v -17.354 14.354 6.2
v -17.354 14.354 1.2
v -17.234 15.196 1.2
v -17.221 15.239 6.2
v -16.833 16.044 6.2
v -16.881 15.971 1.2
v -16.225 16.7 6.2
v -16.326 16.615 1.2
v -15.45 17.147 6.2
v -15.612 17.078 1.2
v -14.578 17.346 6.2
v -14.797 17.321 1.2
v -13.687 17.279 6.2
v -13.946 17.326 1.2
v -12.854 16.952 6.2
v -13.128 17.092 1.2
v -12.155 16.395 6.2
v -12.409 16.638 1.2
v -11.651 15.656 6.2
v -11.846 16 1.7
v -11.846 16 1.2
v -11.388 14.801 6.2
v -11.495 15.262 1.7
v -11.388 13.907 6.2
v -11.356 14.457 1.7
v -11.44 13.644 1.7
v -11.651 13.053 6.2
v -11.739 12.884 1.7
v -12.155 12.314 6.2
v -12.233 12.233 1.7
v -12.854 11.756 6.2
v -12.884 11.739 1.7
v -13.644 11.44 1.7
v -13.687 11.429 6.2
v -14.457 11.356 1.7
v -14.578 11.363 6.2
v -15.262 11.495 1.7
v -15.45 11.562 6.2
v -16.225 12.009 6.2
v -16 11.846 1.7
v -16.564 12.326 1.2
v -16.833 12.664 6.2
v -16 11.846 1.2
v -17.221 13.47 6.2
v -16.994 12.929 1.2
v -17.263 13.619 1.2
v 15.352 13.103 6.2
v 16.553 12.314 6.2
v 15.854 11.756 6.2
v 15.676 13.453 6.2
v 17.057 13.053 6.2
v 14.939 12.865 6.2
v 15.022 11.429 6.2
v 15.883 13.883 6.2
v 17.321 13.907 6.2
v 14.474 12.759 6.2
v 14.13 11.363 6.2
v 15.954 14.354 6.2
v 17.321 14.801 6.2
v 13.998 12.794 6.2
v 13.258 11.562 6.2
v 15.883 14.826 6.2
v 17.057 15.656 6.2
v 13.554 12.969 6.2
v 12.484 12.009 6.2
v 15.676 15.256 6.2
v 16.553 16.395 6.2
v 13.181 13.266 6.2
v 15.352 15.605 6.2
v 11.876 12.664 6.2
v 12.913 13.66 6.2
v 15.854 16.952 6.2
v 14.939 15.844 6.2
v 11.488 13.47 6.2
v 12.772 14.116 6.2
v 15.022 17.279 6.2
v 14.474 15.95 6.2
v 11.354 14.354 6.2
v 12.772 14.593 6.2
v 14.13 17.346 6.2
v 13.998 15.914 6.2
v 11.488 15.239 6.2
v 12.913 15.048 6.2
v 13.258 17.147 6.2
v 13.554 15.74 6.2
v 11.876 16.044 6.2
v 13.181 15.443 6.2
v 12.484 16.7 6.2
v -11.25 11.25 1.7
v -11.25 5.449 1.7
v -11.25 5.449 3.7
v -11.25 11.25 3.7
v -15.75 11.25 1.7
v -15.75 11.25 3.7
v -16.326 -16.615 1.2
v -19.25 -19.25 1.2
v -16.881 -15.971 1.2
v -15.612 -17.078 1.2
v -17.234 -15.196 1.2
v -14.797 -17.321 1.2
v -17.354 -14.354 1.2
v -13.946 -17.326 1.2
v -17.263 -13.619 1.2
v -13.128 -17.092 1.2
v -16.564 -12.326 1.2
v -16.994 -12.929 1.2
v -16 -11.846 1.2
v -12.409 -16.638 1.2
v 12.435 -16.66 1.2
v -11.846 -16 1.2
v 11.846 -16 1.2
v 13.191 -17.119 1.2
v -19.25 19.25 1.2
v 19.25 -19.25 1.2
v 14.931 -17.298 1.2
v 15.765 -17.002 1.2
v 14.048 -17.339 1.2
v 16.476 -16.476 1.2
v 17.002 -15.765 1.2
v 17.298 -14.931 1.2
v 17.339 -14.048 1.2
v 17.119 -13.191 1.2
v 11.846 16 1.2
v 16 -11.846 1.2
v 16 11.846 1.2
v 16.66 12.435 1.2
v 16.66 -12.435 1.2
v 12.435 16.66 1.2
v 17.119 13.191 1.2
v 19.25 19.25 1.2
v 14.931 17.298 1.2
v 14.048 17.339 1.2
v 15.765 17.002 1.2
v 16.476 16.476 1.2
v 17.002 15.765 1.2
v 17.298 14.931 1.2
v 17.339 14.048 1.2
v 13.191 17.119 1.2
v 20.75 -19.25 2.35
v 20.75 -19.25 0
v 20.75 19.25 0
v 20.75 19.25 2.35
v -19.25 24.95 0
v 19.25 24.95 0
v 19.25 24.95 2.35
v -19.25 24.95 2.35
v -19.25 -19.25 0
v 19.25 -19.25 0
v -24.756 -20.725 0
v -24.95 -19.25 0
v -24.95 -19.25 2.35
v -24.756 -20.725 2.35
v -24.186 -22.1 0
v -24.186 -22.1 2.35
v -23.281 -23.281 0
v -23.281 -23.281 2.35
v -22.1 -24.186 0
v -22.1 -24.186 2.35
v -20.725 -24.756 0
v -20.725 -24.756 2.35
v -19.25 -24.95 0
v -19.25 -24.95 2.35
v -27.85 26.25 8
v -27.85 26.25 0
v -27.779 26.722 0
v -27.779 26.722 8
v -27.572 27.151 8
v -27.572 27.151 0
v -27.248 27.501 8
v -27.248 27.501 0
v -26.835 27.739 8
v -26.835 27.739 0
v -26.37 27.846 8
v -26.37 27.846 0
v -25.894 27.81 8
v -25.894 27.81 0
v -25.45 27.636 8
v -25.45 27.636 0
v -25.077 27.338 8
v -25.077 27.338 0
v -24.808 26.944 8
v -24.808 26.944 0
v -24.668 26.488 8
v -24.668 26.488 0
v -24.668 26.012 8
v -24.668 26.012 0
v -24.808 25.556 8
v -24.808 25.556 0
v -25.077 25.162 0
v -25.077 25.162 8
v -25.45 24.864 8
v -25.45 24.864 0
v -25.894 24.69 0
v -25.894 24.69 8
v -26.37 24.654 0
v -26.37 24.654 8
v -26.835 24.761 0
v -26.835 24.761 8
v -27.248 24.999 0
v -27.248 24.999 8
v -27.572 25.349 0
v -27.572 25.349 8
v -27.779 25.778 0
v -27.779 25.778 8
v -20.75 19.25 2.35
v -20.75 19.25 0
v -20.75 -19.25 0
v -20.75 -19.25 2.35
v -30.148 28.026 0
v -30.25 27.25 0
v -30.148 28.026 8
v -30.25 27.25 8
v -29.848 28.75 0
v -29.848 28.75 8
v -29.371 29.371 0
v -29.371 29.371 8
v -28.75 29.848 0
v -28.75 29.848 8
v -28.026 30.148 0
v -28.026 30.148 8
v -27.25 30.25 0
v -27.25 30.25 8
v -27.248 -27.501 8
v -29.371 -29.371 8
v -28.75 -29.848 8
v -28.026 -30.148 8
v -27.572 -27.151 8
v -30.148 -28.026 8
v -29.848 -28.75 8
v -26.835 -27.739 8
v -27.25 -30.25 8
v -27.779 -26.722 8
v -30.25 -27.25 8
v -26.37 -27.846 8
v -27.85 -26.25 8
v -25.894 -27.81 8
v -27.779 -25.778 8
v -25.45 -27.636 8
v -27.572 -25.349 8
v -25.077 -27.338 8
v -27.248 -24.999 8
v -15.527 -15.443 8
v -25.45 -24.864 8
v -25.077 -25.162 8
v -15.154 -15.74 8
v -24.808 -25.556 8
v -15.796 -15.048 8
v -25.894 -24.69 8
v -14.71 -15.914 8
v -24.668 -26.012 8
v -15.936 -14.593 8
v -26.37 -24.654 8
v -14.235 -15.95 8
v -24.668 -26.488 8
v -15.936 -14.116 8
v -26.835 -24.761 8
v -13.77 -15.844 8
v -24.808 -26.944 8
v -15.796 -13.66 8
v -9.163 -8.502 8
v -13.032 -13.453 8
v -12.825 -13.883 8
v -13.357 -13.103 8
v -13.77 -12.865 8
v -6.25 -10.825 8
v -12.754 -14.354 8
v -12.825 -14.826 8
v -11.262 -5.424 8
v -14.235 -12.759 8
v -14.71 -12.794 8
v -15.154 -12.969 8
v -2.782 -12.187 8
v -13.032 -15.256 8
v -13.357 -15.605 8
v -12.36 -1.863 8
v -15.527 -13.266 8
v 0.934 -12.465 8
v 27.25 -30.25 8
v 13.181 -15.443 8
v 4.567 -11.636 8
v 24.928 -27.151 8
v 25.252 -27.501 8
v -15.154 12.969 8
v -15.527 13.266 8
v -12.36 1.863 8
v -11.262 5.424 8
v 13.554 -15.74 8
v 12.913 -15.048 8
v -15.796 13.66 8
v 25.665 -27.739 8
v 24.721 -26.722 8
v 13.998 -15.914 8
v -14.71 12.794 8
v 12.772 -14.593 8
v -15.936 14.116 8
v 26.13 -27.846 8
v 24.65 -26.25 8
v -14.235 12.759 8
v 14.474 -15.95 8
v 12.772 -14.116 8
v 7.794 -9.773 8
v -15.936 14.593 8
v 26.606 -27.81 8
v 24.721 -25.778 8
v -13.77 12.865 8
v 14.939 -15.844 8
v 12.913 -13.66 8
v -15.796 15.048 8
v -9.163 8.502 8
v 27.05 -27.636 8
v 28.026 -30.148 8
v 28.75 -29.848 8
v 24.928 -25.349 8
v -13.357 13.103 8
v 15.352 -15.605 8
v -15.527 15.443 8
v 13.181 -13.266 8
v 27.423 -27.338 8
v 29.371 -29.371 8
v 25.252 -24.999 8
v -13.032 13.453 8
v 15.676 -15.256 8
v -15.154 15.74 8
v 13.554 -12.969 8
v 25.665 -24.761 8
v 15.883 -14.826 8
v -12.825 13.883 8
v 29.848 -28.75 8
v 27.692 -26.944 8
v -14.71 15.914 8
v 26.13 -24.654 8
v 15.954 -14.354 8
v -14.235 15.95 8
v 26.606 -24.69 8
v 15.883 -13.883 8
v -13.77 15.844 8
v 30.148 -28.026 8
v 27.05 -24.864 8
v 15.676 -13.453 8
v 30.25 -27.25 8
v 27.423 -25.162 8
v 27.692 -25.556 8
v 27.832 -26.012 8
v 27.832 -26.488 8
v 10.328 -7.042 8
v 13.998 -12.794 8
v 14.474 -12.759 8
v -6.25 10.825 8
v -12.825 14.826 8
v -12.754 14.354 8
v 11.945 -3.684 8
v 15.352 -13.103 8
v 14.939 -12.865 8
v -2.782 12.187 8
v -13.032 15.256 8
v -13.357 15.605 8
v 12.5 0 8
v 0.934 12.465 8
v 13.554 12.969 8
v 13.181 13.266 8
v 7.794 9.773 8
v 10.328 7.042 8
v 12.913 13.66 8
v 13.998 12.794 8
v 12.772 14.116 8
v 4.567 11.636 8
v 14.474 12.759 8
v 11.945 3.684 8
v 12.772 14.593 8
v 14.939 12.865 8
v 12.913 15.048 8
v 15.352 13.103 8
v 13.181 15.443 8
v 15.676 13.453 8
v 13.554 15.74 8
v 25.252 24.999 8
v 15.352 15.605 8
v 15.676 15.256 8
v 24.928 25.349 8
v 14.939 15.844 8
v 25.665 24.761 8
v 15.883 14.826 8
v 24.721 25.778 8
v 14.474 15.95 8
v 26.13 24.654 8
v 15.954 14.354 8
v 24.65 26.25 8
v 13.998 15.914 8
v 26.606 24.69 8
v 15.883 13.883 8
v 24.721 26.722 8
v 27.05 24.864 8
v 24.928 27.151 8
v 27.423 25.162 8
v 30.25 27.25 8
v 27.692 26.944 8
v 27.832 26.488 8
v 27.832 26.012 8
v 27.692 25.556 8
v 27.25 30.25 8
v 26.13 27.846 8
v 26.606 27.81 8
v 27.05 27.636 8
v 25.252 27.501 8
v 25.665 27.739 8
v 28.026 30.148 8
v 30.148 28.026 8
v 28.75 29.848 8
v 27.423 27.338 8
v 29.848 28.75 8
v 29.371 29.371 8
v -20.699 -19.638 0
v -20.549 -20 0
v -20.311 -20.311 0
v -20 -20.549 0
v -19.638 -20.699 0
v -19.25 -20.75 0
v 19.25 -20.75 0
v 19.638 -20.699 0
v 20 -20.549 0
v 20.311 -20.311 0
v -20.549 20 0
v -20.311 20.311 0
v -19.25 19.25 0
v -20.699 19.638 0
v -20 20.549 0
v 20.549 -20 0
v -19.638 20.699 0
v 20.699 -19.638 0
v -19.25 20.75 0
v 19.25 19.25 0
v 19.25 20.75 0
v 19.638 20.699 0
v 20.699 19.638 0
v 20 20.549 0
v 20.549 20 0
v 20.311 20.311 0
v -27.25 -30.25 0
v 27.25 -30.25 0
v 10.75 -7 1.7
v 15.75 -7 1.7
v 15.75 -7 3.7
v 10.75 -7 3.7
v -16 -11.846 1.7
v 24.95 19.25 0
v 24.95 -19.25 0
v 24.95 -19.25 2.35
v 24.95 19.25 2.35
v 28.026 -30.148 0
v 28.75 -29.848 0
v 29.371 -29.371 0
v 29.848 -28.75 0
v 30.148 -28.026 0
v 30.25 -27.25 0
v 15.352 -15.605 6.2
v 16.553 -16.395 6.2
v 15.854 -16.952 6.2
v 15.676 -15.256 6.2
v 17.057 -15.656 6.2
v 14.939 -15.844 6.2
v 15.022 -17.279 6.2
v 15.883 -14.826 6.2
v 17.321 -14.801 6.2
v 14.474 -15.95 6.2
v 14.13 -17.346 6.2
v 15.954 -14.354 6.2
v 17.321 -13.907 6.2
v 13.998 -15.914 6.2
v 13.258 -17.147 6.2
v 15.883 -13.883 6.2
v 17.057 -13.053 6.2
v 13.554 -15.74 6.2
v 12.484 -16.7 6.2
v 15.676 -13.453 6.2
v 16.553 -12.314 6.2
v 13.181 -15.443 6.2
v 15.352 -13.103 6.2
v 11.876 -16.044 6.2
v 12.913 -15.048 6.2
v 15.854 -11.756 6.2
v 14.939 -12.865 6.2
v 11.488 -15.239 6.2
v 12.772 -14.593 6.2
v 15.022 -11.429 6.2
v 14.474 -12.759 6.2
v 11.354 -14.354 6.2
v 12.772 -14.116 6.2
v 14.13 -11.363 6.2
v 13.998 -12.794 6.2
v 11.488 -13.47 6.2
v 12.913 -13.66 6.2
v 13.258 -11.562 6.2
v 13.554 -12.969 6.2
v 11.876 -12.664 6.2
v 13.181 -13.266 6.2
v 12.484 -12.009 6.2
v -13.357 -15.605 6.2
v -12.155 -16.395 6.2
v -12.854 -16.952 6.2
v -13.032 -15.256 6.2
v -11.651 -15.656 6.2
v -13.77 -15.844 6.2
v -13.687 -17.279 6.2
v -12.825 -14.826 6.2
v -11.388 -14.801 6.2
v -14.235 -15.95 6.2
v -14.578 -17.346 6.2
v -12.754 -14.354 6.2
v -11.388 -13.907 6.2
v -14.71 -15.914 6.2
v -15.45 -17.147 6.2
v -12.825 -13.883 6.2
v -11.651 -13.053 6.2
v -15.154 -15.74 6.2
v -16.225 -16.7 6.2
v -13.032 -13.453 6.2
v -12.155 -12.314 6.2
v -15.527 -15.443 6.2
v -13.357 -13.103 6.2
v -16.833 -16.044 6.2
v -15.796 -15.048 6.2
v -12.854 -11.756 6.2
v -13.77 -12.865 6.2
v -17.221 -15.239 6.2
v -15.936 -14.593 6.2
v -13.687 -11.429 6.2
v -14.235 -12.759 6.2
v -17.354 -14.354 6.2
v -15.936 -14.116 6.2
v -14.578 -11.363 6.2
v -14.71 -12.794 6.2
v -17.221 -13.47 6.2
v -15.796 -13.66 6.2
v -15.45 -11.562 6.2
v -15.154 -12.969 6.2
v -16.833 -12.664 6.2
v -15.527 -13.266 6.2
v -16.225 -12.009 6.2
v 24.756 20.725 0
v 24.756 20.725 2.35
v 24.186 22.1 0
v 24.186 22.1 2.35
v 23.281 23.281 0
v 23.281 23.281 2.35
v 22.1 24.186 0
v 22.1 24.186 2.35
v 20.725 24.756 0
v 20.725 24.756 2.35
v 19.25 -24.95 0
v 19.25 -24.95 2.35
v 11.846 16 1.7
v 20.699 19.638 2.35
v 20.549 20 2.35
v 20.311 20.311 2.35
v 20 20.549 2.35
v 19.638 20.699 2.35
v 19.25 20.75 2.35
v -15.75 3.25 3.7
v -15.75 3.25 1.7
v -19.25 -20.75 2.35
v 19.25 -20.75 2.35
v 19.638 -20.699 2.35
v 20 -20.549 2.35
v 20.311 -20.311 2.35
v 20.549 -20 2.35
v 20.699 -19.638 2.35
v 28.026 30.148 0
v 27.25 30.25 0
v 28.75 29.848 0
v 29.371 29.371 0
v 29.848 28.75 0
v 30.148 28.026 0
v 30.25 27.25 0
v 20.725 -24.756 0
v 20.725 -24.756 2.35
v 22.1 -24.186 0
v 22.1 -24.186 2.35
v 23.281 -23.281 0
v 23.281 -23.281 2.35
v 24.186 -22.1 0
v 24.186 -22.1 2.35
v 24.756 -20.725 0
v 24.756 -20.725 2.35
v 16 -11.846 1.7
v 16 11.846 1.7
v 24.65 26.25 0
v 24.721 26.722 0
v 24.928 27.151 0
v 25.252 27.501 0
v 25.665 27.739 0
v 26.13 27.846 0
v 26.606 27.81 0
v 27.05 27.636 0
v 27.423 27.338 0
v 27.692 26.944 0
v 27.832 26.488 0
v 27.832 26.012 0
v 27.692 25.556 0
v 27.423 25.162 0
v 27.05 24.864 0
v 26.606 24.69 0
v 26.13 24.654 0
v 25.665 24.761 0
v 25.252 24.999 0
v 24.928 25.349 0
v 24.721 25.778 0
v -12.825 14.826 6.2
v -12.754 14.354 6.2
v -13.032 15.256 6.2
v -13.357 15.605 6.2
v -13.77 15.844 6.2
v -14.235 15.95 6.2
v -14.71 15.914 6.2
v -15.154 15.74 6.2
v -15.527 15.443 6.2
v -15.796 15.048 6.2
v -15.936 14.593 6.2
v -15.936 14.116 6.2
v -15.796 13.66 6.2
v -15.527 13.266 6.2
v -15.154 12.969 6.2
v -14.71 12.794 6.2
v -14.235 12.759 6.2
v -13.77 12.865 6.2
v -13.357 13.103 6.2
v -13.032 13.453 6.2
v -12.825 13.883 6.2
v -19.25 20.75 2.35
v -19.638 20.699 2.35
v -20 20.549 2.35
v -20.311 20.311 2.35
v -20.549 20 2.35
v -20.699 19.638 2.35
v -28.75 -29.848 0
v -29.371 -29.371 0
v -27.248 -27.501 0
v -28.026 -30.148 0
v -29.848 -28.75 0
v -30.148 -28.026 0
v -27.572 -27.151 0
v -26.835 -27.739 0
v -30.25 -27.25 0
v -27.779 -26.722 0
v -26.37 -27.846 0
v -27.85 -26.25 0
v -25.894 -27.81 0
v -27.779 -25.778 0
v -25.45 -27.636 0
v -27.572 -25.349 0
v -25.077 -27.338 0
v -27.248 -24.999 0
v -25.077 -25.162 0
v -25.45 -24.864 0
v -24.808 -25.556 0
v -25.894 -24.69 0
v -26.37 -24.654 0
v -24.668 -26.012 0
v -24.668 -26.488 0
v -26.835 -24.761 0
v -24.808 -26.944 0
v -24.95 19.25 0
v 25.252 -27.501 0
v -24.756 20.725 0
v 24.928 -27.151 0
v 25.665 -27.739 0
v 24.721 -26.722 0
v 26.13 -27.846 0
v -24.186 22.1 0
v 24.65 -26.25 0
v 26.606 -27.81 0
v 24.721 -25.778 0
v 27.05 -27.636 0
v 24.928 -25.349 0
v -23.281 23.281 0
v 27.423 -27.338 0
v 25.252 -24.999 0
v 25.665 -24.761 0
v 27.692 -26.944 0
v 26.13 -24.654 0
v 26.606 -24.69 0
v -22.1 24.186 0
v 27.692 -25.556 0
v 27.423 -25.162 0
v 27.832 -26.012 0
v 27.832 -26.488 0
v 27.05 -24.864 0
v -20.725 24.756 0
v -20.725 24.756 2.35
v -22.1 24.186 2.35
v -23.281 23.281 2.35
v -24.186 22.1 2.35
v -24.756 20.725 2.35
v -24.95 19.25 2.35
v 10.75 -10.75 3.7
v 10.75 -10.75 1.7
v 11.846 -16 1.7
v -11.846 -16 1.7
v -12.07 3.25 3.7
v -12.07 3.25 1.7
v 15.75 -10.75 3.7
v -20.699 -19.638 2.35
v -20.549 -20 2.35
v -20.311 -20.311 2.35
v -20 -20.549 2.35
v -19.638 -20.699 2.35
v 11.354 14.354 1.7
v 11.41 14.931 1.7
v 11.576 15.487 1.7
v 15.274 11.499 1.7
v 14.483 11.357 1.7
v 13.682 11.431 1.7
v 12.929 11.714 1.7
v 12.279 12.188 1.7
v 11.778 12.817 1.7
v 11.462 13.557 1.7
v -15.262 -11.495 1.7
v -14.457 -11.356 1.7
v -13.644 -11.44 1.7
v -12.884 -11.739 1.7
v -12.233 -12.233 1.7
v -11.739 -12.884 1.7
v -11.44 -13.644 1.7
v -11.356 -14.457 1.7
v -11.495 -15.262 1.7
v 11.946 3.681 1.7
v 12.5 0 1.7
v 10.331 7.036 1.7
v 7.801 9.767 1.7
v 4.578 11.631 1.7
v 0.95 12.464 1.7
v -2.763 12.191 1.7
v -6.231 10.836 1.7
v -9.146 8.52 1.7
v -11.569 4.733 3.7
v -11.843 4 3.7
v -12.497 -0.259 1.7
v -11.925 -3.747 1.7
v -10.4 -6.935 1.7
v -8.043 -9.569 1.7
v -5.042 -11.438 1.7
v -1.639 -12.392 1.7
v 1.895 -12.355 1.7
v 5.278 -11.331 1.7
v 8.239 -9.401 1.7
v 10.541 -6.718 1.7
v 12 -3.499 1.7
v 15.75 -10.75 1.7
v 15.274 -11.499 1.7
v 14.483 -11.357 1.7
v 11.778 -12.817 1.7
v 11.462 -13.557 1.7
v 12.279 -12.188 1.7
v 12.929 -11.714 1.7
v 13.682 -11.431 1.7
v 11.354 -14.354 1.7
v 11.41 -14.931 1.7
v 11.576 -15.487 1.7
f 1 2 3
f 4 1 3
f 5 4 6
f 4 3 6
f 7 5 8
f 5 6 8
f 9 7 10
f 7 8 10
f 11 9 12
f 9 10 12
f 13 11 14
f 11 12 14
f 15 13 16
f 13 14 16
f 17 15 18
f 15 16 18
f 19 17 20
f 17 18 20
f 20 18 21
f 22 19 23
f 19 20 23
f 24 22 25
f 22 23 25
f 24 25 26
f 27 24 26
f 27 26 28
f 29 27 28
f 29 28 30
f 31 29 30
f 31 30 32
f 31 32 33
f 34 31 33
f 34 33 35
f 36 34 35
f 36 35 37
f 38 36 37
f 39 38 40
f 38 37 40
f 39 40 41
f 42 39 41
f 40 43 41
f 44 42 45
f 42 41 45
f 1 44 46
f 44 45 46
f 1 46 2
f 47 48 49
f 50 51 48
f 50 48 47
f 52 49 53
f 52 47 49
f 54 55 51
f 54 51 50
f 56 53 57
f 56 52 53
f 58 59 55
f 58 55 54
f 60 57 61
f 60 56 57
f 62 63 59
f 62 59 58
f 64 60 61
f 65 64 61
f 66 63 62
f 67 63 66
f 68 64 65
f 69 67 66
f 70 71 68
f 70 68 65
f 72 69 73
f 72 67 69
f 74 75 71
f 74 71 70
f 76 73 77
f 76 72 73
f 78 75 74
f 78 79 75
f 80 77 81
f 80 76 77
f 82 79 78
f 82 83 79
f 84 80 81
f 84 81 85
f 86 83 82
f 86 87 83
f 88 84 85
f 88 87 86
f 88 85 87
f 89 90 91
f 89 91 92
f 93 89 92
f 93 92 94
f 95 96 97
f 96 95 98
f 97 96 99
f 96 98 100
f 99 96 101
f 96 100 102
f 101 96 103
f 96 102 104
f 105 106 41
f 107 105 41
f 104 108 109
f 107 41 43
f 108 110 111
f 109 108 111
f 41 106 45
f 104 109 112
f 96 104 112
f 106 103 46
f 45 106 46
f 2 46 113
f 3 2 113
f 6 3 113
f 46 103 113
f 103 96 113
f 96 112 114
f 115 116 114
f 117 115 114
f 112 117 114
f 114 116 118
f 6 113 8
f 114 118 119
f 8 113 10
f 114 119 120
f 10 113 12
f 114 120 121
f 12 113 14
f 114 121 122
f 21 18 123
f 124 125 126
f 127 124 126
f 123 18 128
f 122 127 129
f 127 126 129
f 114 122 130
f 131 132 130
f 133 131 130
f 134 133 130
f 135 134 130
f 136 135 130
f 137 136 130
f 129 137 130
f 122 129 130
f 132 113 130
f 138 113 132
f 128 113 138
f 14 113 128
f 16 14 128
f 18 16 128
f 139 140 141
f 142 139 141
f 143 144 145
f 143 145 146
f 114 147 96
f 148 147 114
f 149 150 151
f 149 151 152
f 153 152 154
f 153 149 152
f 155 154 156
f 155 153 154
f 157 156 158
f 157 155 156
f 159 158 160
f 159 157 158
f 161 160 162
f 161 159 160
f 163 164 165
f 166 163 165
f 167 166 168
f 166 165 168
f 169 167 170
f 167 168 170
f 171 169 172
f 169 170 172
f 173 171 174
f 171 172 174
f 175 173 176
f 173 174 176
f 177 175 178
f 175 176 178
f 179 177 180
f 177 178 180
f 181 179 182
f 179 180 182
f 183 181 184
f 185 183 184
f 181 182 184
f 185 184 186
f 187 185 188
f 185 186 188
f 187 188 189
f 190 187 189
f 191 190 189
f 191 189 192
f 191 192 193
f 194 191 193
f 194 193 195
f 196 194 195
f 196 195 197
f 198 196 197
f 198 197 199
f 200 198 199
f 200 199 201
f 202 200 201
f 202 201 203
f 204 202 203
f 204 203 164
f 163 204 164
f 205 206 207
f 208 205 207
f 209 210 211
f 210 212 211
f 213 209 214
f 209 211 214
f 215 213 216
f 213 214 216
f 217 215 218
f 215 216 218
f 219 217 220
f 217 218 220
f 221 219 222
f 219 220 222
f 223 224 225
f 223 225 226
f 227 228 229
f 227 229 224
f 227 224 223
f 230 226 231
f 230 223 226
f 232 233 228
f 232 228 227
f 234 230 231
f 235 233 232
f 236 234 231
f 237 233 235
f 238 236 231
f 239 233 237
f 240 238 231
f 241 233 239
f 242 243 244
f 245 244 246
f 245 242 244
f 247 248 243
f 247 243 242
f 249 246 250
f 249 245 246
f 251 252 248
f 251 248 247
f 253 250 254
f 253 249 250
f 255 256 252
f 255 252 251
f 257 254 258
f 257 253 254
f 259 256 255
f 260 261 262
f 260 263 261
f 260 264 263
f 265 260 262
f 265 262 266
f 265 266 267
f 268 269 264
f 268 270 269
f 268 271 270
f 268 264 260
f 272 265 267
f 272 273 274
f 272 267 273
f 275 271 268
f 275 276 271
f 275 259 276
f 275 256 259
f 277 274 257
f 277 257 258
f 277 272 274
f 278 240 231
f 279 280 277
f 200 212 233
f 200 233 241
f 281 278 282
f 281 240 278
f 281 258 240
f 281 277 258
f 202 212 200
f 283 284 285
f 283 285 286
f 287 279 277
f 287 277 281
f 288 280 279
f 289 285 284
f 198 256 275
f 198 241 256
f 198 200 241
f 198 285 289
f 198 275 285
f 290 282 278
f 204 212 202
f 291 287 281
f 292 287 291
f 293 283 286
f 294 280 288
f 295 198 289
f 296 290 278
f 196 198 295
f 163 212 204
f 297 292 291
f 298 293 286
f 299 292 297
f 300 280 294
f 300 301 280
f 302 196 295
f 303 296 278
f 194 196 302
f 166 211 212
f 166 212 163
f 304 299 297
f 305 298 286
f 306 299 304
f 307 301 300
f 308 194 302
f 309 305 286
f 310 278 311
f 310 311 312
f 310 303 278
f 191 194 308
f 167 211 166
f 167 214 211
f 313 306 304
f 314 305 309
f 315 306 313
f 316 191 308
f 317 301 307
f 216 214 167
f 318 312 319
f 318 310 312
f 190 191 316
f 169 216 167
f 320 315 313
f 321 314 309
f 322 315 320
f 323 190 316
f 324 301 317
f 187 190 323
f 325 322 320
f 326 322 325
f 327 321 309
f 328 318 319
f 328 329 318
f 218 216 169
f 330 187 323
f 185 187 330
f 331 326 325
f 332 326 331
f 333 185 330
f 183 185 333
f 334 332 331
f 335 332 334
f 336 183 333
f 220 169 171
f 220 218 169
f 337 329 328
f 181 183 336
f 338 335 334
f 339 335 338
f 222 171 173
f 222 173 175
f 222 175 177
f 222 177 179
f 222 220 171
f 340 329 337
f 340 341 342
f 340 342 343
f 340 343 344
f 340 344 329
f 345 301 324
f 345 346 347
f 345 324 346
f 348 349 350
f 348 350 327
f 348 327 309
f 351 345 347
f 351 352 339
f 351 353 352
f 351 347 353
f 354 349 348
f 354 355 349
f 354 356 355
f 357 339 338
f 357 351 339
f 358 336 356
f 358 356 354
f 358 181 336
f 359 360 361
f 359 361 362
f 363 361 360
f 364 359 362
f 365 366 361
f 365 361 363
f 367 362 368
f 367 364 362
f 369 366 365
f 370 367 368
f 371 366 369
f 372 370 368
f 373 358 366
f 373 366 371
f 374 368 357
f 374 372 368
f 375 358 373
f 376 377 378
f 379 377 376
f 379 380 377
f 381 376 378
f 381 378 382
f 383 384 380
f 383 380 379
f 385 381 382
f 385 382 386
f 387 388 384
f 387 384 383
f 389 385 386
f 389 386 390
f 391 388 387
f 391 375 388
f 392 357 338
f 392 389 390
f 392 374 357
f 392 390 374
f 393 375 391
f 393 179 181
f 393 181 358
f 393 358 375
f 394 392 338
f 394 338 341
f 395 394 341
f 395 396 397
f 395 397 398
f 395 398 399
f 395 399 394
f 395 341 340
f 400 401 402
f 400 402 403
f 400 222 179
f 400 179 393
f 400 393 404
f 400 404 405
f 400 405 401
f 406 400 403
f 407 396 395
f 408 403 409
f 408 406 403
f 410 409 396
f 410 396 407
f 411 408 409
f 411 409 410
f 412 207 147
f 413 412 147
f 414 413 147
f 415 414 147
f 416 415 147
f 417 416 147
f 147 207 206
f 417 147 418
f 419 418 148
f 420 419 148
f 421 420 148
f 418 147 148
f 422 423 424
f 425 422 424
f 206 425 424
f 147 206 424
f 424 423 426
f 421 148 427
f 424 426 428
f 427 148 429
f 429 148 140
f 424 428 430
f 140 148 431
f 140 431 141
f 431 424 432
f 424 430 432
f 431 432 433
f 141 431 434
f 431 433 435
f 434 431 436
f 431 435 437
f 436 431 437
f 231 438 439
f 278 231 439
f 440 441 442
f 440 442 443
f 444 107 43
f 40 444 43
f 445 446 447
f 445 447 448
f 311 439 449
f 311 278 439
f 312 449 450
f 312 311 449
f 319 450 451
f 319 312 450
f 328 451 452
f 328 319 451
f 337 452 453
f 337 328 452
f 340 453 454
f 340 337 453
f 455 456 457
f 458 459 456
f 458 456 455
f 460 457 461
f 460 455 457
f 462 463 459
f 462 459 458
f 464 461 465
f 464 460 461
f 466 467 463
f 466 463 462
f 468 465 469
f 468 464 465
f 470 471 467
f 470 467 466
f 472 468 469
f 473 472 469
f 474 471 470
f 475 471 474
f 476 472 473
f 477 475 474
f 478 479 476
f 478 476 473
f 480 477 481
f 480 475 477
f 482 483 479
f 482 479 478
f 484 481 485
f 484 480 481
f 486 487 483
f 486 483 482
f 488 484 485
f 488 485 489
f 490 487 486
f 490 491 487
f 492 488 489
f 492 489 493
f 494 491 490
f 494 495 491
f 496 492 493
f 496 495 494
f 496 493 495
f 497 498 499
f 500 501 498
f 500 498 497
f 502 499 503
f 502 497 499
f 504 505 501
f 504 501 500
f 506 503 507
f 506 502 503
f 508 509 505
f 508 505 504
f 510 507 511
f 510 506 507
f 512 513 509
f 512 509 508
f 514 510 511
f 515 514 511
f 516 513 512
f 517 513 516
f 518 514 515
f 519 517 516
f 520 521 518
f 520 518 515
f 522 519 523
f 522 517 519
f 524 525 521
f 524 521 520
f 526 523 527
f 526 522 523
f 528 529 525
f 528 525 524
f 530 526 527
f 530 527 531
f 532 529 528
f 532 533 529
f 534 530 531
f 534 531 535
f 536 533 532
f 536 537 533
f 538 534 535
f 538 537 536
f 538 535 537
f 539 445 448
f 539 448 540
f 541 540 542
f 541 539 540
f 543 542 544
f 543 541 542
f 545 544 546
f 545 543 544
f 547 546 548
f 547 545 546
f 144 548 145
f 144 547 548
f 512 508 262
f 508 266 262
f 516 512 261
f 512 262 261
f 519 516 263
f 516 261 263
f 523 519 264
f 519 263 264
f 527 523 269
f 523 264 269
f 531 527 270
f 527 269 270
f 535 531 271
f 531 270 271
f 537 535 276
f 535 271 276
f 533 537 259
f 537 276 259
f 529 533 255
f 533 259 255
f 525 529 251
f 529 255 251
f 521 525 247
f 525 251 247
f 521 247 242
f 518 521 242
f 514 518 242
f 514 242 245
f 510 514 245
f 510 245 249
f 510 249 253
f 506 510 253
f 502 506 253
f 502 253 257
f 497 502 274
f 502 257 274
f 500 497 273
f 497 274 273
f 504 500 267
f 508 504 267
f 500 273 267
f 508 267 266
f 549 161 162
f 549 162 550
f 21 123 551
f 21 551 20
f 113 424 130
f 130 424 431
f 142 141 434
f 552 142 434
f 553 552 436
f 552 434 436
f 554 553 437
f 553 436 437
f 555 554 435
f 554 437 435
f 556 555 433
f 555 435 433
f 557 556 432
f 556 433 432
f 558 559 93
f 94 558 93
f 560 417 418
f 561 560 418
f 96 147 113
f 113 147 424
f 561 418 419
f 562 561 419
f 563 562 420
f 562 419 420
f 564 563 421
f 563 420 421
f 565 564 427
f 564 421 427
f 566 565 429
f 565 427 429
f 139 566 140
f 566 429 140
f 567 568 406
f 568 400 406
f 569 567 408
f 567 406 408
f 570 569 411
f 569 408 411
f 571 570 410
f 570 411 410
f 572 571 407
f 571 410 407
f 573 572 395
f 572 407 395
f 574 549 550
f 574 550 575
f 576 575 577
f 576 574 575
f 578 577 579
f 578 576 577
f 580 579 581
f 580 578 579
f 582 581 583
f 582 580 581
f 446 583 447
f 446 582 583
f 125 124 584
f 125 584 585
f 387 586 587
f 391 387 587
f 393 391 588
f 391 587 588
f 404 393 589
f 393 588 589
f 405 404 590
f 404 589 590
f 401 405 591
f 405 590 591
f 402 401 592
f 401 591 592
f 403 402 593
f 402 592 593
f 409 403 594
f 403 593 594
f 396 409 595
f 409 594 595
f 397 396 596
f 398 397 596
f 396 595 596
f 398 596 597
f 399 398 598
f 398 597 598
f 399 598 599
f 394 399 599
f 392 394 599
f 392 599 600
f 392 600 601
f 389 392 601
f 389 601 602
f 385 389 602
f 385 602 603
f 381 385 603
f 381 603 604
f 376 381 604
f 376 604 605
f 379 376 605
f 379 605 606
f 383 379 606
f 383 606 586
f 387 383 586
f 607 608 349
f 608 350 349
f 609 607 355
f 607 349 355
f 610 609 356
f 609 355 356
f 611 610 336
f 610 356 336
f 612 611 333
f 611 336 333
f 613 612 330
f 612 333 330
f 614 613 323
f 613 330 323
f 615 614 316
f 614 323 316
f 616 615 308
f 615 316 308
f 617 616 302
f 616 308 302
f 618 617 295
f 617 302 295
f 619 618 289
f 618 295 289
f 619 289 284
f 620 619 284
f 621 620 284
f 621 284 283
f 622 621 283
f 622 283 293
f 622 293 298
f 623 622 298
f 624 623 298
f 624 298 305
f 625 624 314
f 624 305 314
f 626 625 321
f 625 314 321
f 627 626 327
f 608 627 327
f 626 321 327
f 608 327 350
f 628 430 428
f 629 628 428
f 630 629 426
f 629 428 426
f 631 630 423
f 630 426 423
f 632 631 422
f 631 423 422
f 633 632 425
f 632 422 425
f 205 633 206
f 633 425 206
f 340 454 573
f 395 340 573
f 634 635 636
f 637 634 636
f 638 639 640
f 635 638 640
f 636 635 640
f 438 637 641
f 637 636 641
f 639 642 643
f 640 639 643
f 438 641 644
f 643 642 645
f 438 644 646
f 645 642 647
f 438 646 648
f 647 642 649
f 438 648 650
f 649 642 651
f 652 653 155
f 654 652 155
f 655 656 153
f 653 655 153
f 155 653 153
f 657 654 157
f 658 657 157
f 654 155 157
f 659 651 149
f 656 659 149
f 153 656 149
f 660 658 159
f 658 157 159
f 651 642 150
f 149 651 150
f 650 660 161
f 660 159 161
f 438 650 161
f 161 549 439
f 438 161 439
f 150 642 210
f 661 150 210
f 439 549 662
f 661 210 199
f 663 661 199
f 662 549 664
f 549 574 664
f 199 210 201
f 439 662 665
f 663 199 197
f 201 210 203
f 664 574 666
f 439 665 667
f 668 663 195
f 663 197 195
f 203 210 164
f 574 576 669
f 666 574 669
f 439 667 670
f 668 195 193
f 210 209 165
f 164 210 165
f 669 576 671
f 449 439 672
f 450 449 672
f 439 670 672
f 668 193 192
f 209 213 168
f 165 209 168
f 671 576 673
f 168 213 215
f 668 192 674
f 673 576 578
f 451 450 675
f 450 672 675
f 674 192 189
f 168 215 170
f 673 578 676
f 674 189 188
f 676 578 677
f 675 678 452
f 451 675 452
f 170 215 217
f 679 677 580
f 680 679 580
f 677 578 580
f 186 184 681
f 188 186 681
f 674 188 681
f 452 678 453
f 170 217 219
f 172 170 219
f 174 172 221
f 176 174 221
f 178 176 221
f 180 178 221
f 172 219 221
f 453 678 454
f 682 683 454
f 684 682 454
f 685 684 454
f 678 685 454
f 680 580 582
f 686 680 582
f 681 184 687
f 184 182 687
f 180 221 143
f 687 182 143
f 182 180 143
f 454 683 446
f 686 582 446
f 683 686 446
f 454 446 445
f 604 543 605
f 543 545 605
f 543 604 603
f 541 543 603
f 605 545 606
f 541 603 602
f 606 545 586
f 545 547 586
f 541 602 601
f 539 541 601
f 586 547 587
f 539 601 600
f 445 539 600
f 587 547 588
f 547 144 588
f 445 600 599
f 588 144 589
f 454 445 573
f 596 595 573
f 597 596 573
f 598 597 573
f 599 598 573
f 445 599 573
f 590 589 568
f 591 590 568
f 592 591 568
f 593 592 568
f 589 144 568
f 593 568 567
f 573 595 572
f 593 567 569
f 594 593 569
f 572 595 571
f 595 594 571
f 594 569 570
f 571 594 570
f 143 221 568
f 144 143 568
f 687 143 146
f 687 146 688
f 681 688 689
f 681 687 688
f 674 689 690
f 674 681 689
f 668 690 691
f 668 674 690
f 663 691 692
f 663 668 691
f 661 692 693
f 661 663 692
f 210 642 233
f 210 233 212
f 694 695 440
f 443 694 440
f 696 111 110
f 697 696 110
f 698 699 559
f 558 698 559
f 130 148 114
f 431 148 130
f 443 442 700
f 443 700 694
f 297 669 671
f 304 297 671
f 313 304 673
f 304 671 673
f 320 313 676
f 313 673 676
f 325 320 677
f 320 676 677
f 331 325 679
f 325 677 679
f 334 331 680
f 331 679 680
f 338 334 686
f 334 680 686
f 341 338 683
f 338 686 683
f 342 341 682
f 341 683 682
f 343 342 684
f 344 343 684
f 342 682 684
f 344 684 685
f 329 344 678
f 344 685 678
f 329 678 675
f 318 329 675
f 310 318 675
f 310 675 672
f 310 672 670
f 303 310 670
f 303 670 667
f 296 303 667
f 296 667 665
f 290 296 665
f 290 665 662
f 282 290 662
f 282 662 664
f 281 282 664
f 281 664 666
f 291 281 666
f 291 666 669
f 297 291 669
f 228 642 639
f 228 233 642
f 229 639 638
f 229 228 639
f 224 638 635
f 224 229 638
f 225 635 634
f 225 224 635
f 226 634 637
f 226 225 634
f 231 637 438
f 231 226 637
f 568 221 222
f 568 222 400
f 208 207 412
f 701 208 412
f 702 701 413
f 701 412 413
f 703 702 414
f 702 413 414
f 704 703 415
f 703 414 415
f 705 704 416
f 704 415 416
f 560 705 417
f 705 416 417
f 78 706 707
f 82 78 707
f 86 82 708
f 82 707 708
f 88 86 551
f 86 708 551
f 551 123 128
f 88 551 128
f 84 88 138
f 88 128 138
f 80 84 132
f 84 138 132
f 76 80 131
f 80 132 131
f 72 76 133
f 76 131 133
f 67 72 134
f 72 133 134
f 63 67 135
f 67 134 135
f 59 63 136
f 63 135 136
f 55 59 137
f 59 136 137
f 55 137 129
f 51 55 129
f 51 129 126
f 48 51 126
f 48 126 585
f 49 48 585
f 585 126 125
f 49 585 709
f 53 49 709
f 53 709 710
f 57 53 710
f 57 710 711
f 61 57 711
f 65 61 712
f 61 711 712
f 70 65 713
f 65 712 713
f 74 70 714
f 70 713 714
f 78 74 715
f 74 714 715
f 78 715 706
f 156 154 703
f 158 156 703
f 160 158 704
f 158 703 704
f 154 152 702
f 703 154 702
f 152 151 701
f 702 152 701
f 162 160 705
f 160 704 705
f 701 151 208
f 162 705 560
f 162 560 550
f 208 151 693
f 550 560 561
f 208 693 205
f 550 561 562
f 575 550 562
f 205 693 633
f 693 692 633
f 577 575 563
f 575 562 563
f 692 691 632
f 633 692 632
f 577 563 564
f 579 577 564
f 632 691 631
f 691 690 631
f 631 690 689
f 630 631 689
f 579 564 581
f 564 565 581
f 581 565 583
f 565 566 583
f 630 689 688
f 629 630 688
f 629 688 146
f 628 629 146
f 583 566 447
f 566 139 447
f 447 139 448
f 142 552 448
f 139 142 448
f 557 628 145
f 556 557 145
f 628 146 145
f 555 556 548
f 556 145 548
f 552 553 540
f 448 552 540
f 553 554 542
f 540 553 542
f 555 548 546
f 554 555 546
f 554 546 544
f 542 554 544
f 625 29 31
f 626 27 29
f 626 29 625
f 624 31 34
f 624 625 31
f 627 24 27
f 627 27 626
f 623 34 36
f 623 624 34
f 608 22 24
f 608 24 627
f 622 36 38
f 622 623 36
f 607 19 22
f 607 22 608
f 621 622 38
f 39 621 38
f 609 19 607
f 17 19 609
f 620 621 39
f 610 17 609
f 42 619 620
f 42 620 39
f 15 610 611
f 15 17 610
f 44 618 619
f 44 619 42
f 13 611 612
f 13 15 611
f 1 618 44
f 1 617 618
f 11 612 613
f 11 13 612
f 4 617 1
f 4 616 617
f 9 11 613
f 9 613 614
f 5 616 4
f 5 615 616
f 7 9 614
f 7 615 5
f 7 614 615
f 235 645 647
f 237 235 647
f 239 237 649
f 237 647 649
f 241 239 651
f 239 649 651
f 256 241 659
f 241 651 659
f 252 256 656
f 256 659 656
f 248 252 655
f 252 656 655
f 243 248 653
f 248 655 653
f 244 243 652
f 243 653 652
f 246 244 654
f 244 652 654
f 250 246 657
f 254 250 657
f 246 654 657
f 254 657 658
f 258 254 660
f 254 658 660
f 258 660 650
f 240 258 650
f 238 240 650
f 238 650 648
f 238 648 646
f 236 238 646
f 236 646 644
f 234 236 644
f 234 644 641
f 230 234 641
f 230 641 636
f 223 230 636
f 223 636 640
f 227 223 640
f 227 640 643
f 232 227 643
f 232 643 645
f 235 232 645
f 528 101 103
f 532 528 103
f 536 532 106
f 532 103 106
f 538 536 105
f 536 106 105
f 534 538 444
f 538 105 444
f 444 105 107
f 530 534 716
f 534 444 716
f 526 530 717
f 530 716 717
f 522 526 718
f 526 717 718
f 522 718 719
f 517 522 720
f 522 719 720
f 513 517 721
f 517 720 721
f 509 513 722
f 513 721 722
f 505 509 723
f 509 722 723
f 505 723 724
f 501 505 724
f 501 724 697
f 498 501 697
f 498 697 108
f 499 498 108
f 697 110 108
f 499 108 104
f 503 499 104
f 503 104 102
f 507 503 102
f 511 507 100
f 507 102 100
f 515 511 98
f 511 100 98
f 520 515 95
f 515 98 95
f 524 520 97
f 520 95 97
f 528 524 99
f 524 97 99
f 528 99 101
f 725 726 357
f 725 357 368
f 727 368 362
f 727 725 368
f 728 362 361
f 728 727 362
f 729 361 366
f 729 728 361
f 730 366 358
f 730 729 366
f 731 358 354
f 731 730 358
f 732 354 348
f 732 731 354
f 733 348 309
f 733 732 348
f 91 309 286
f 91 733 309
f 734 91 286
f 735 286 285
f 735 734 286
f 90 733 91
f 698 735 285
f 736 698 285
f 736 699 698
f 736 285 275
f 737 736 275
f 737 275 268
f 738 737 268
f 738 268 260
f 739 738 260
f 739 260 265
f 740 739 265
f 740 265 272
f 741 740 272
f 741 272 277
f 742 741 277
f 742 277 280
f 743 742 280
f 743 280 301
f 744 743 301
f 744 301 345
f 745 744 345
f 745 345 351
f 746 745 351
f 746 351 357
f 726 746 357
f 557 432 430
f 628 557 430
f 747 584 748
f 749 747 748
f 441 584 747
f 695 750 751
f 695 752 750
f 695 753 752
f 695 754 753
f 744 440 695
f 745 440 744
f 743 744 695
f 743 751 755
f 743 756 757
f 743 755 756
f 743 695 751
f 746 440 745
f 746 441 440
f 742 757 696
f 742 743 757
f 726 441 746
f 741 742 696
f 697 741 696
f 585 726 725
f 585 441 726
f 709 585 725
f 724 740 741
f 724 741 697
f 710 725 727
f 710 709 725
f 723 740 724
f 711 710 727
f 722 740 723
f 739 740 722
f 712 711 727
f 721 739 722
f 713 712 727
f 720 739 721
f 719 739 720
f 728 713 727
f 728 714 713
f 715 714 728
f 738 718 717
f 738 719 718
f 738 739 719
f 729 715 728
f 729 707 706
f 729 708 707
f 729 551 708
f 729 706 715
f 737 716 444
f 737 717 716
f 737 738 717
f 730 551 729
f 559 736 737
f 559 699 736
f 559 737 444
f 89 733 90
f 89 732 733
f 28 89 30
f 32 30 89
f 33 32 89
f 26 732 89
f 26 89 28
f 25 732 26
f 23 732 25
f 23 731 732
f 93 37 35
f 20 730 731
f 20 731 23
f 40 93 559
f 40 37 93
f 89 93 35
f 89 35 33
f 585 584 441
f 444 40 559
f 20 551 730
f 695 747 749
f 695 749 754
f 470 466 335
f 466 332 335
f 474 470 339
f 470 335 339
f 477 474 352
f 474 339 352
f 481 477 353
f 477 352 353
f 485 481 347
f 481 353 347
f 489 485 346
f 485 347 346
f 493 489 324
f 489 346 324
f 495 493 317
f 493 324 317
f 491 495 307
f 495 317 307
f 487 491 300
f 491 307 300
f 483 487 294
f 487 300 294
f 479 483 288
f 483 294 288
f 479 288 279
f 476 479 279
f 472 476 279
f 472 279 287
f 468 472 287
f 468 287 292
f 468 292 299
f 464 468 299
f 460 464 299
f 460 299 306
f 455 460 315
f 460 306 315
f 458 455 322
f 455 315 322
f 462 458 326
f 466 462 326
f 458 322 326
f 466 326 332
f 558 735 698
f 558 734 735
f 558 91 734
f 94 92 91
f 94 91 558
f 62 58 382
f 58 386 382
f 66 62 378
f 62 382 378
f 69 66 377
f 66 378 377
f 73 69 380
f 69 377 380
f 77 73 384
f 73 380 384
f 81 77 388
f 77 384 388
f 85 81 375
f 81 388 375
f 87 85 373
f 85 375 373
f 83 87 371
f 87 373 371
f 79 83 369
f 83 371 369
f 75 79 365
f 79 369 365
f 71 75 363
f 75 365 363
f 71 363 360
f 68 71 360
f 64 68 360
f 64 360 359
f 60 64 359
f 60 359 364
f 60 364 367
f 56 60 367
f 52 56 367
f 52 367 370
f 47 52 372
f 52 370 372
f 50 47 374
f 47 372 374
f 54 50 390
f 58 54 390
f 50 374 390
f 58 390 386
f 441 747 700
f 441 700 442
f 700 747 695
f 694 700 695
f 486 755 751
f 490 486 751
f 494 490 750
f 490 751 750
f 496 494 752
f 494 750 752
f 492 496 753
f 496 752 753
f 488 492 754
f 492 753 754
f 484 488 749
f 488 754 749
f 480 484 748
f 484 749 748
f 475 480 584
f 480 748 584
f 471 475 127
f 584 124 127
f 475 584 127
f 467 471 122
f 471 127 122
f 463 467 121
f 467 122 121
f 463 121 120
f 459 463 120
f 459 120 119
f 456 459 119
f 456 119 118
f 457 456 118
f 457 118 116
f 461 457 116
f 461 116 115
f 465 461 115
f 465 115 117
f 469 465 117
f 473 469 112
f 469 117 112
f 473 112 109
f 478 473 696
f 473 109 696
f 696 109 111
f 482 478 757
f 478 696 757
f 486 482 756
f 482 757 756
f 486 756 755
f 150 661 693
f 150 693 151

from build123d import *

# Parameters (mm, degrees)
SKETCH_1_W          = 60.5
SKETCH_1_H          = 60.5
SKETCH_1_W_2        = 38.5
SKETCH_1_H_2        = 38.5
EXTRUDE_1_DEPTH     = 8
CUT_EXTRUDE_1_DEPTH = 2.35
SKETCH_3_R          = 1.6
CUT_EXTRUDE_2_DEPTH = 44.521546388
SKETCH_4_W          = 38.5
SKETCH_4_H          = 38.5
SKETCH_4_R          = 12.5
EXTRUDE_2_DEPTH     = 6.8
HOLE_WIZARD_M3_1_D  = 3.2
SKETCH_10_W         = 32
SKETCH_10_H         = 32
CUT_EXTRUDE_4_DEPTH = 0.5
SKETCH_11_W         = 4.5
SKETCH_11_H         = 8
SKETCH_11_W_2       = 5
SKETCH_11_H_2       = 3.75
CUT_EXTRUDE_6_DEPTH = 2
SKETCH_9_R          = 3
CUT_EXTRUDE_7_DEPTH = 5
FILLET_1_R          = 3


with BuildPart() as part:
    # ｽｹｯﾁ1 → ﾎﾞｽ - 押し出し1 (new body)
    with BuildSketch(Plane.XY):
        Rectangle(SKETCH_1_W, SKETCH_1_H)
        Rectangle(SKETCH_1_W_2, SKETCH_1_H_2, mode=Mode.SUBTRACT)
    extrude(amount=EXTRUDE_1_DEPTH)

    # ｽｹｯﾁ2 → ｶｯﾄ - 押し出し1 (cut)
    with BuildSketch(Plane(origin=(0, 0, 0), x_dir=(-1, 0, 0), z_dir=(0, 0, -1))):
        with BuildLine():
            Line((-19.25, 24.95), (19.25, 24.95))
            ThreePointArc((19.25, 24.95), (23.280508653, 23.280508653), (24.95, 19.25))
            Line((24.95, 19.25), (24.95, -19.25))
            ThreePointArc((24.95, -19.25), (23.280508653, -23.280508653), (19.25, -24.95))
            Line((19.25, -24.95), (-19.25, -24.95))
            ThreePointArc((-19.25, -24.95), (-23.280508653, -23.280508653), (-24.95, -19.25))
            Line((-24.95, -19.25), (-24.95, 19.25))
            ThreePointArc((-24.95, 19.25), (-23.280508653, 23.280508653), (-19.25, 24.95))
        make_face()
        with BuildLine():
            Line((-19.25, 20.75), (19.25, 20.75))
            ThreePointArc((19.25, 20.75), (20.310660172, 20.310660172), (20.75, 19.25))
            Line((20.75, 19.25), (20.75, -19.25))
            ThreePointArc((20.75, -19.25), (20.310660172, -20.310660172), (19.25, -20.75))
            Line((19.25, -20.75), (-19.25, -20.75))
            ThreePointArc((-19.25, -20.75), (-20.310660172, -20.310660172), (-20.75, -19.25))
            Line((-20.75, -19.25), (-20.75, 19.25))
            ThreePointArc((-20.75, 19.25), (-20.310660172, 20.310660172), (-19.25, 20.75))
        make_face(mode=Mode.SUBTRACT)
    extrude(amount=-CUT_EXTRUDE_1_DEPTH, mode=Mode.SUBTRACT)

    # ｽｹｯﾁ3 → ｶｯﾄ - 押し出し2 (cut, through all)
    with BuildSketch(Plane(origin=(0, 0, 0), x_dir=(-1, 0, 0), z_dir=(0, 0, -1))):
        with Locations((26.25, 26.25)):
            Circle(SKETCH_3_R)
        with Locations((26.25, -26.25)):
            Circle(SKETCH_3_R)
        with Locations((-26.25, -26.25)):
            Circle(SKETCH_3_R)
        with Locations((-26.25, 26.25)):
            Circle(SKETCH_3_R)
    extrude(amount=-CUT_EXTRUDE_2_DEPTH, mode=Mode.SUBTRACT)

    # ｽｹｯﾁ4 → ﾎﾞｽ - 押し出し2 (add)
    with BuildSketch(Plane.XY.offset(1.2)):
        Rectangle(SKETCH_4_W, SKETCH_4_H)
        Circle(SKETCH_4_R, mode=Mode.SUBTRACT)
    extrude(amount=EXTRUDE_2_DEPTH)

    # M3 すきま穴1 (through all)
    with Locations(Plane(origin=(0, 0, 1.2), x_dir=(-1, 0, 0), z_dir=(0, 0, -1))):
        with Locations((14.354267658, 14.354267658), (-14.354267658, 14.354267658), (-14.354267658, -14.354267658), (14.354267658, -14.354267658)):
            Hole(HOLE_WIZARD_M3_1_D / 2)

    # ｽｹｯﾁ10 → ｶｯﾄ - 押し出し4 (cut)
    with BuildSketch(Plane(origin=(0, 0, 1.2), x_dir=(-1, 0, 0), z_dir=(0, 0, -1))):
        Rectangle(SKETCH_10_W, SKETCH_10_H)
    extrude(amount=-CUT_EXTRUDE_4_DEPTH, mode=Mode.SUBTRACT)

    # ｽｹｯﾁ11 → ｶｯﾄ - 押し出し6 (cut)
    with BuildSketch(Plane(origin=(0, 0, 1.7), x_dir=(-1, 0, 0), z_dir=(0, 0, -1))):
        with Locations((13.5, 7.25)):
            Rectangle(SKETCH_11_W, SKETCH_11_H)
        with Locations((-13.25, -8.875)):
            Rectangle(SKETCH_11_W_2, SKETCH_11_H_2)
    extrude(amount=-CUT_EXTRUDE_6_DEPTH, mode=Mode.SUBTRACT)

    # ｽｹｯﾁ9 → ｶｯﾄ - 押し出し7 (cut)
    with BuildSketch(Plane(origin=(0, 0, 1.2), x_dir=(-1, 0, 0), z_dir=(0, 0, -1))):
        with Locations((14.354267658, 14.354267658)):
            Circle(SKETCH_9_R)
        with Locations((-14.354267658, 14.354267658)):
            Circle(SKETCH_9_R)
        with Locations((14.354267658, -14.354267658)):
            Circle(SKETCH_9_R)
        with Locations((-14.354267658, -14.354267658)):
            Circle(SKETCH_9_R)
    extrude(amount=-CUT_EXTRUDE_7_DEPTH, mode=Mode.SUBTRACT)

    # ﾌｨﾚｯﾄ1
    fillet_1_edges = [part.edges().sort_by_distance(p)[0] for p in [
        (30.25, -30.25, 4),
        (-30.25, -30.25, 4),
        (-30.25, 30.25, 4),
        (30.25, 30.25, 4),
    ]]
    fillet(fillet_1_edges, radius=FILLET_1_R)


solid = part.part
